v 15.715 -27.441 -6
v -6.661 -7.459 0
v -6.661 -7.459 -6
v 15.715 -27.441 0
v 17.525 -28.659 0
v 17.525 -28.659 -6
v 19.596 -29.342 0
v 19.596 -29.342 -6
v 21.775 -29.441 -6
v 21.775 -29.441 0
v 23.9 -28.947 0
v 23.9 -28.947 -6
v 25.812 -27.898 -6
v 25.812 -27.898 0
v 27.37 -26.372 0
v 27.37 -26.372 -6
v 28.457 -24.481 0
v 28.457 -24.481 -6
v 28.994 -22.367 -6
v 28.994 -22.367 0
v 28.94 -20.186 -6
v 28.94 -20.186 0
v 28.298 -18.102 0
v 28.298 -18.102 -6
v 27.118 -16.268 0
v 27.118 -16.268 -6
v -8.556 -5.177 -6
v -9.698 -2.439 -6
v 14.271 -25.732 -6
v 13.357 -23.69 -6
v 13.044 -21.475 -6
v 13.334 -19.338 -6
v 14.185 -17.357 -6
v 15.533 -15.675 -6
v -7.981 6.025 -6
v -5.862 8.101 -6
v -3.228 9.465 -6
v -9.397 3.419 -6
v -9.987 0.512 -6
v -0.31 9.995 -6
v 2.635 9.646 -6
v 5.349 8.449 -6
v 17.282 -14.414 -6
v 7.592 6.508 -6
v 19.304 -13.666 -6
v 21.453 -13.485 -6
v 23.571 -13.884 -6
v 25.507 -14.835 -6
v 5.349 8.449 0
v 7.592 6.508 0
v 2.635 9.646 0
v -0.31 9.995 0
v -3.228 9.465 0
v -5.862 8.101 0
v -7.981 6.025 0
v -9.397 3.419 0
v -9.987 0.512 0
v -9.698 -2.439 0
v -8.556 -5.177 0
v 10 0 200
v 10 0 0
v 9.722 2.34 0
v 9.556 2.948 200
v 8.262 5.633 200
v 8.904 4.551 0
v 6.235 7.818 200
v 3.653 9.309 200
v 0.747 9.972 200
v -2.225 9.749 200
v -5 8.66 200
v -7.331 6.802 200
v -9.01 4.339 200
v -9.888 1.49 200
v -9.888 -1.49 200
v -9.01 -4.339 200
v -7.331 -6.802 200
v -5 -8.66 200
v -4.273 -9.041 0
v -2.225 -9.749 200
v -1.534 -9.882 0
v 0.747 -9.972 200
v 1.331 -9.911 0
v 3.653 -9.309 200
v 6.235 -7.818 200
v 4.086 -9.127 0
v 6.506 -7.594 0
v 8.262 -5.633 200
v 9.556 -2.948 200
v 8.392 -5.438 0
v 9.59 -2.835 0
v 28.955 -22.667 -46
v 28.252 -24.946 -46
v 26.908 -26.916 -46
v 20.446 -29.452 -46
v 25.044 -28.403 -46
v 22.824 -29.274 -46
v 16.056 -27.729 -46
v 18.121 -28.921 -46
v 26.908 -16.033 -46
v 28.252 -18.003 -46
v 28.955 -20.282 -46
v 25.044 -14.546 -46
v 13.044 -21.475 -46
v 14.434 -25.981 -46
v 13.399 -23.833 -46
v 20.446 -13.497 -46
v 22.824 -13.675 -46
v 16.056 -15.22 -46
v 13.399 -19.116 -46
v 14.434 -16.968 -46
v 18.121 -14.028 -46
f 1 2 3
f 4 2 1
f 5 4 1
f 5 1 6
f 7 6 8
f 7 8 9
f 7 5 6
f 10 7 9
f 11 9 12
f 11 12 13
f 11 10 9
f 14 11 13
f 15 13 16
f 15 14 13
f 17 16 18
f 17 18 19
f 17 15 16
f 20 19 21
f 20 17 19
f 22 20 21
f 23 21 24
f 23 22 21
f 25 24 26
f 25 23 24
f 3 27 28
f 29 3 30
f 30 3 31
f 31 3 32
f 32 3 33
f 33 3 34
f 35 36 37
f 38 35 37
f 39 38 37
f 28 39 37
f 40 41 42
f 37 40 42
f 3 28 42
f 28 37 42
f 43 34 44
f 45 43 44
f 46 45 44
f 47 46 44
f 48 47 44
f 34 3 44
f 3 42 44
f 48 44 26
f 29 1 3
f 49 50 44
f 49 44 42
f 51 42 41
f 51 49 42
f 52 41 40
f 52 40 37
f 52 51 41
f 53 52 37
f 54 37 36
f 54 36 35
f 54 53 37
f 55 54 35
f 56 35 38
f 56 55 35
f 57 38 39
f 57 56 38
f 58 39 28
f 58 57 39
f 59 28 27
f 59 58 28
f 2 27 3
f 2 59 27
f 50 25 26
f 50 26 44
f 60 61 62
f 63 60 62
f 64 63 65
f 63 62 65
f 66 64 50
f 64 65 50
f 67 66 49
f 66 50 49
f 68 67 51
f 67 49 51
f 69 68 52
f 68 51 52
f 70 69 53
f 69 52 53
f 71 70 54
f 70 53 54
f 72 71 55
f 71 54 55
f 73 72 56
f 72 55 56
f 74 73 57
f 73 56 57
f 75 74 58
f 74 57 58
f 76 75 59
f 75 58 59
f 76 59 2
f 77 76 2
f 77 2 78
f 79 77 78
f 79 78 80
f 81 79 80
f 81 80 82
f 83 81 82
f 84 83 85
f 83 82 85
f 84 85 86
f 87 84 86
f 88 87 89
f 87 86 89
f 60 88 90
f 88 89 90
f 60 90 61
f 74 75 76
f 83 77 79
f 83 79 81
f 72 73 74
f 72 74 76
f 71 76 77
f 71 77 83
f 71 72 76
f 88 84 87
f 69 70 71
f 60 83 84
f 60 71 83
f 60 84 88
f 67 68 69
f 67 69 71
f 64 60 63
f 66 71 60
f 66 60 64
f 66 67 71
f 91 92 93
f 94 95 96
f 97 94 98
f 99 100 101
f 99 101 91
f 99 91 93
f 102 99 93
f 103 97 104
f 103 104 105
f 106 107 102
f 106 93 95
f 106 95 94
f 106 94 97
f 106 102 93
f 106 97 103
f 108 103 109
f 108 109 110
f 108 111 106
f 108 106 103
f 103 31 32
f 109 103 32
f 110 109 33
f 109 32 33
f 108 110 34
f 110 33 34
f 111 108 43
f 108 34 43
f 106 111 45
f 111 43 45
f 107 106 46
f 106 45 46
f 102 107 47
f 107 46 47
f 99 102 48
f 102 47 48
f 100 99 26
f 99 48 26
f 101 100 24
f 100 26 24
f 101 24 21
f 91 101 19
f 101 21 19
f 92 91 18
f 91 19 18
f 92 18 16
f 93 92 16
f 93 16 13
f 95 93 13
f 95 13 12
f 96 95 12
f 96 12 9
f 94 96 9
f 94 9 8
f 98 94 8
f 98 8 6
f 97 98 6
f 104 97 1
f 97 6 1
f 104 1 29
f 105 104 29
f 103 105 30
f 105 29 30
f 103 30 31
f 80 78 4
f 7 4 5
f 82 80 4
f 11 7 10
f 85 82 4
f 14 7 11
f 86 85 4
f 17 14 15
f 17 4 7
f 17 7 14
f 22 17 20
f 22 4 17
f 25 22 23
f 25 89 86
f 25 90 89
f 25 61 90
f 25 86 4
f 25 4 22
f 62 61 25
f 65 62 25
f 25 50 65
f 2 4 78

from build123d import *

# Parameters (mm, degrees)
SKETCH1_R           = 10
BOSS_EXTRUDE1_DEPTH = 200
BOSS_EXTRUDE2_DEPTH = 6
SKETCH4_R           = 8
BOSS_EXTRUDE3_DEPTH = 40


with BuildPart() as part:
    # Sketch1 → Boss-Extrude1 (new body)
    with BuildSketch(Plane.XY):
        Circle(SKETCH1_R)
    extrude(amount=BOSS_EXTRUDE1_DEPTH)

    # Sketch2 → Boss-Extrude2 (add)
    with BuildSketch(Plane(origin=(0, 0, 0), x_dir=(-1, 0, 0), z_dir=(0, 0, -1))):
        with BuildLine():
            Line((-27.117555988, -16.267702887), (-7.592066465, 6.508496508))
            ThreePointArc((-7.592066465, 6.508496508), (6.999097965, 7.142312488), (6.660920323, -7.458695627))
            Line((6.660920323, -7.458695627), (-15.715166558, -27.441456595))
            ThreePointArc((-15.715166558, -27.441456595), (-26.643181188, -27.188350084), (-27.117555988, -16.267702887))
        make_face()
    extrude(amount=BOSS_EXTRUDE2_DEPTH)

    # Sketch4 → Boss-Extrude3 (add)
    with BuildSketch(Plane(origin=(0, 0, -6), x_dir=(-1, 0, 0), z_dir=(0, 0, -1))):
        with Locations((-21.043902817, -21.474500093)):
            Circle(SKETCH4_R)
    extrude(amount=BOSS_EXTRUDE3_DEPTH)


solid = part.part
